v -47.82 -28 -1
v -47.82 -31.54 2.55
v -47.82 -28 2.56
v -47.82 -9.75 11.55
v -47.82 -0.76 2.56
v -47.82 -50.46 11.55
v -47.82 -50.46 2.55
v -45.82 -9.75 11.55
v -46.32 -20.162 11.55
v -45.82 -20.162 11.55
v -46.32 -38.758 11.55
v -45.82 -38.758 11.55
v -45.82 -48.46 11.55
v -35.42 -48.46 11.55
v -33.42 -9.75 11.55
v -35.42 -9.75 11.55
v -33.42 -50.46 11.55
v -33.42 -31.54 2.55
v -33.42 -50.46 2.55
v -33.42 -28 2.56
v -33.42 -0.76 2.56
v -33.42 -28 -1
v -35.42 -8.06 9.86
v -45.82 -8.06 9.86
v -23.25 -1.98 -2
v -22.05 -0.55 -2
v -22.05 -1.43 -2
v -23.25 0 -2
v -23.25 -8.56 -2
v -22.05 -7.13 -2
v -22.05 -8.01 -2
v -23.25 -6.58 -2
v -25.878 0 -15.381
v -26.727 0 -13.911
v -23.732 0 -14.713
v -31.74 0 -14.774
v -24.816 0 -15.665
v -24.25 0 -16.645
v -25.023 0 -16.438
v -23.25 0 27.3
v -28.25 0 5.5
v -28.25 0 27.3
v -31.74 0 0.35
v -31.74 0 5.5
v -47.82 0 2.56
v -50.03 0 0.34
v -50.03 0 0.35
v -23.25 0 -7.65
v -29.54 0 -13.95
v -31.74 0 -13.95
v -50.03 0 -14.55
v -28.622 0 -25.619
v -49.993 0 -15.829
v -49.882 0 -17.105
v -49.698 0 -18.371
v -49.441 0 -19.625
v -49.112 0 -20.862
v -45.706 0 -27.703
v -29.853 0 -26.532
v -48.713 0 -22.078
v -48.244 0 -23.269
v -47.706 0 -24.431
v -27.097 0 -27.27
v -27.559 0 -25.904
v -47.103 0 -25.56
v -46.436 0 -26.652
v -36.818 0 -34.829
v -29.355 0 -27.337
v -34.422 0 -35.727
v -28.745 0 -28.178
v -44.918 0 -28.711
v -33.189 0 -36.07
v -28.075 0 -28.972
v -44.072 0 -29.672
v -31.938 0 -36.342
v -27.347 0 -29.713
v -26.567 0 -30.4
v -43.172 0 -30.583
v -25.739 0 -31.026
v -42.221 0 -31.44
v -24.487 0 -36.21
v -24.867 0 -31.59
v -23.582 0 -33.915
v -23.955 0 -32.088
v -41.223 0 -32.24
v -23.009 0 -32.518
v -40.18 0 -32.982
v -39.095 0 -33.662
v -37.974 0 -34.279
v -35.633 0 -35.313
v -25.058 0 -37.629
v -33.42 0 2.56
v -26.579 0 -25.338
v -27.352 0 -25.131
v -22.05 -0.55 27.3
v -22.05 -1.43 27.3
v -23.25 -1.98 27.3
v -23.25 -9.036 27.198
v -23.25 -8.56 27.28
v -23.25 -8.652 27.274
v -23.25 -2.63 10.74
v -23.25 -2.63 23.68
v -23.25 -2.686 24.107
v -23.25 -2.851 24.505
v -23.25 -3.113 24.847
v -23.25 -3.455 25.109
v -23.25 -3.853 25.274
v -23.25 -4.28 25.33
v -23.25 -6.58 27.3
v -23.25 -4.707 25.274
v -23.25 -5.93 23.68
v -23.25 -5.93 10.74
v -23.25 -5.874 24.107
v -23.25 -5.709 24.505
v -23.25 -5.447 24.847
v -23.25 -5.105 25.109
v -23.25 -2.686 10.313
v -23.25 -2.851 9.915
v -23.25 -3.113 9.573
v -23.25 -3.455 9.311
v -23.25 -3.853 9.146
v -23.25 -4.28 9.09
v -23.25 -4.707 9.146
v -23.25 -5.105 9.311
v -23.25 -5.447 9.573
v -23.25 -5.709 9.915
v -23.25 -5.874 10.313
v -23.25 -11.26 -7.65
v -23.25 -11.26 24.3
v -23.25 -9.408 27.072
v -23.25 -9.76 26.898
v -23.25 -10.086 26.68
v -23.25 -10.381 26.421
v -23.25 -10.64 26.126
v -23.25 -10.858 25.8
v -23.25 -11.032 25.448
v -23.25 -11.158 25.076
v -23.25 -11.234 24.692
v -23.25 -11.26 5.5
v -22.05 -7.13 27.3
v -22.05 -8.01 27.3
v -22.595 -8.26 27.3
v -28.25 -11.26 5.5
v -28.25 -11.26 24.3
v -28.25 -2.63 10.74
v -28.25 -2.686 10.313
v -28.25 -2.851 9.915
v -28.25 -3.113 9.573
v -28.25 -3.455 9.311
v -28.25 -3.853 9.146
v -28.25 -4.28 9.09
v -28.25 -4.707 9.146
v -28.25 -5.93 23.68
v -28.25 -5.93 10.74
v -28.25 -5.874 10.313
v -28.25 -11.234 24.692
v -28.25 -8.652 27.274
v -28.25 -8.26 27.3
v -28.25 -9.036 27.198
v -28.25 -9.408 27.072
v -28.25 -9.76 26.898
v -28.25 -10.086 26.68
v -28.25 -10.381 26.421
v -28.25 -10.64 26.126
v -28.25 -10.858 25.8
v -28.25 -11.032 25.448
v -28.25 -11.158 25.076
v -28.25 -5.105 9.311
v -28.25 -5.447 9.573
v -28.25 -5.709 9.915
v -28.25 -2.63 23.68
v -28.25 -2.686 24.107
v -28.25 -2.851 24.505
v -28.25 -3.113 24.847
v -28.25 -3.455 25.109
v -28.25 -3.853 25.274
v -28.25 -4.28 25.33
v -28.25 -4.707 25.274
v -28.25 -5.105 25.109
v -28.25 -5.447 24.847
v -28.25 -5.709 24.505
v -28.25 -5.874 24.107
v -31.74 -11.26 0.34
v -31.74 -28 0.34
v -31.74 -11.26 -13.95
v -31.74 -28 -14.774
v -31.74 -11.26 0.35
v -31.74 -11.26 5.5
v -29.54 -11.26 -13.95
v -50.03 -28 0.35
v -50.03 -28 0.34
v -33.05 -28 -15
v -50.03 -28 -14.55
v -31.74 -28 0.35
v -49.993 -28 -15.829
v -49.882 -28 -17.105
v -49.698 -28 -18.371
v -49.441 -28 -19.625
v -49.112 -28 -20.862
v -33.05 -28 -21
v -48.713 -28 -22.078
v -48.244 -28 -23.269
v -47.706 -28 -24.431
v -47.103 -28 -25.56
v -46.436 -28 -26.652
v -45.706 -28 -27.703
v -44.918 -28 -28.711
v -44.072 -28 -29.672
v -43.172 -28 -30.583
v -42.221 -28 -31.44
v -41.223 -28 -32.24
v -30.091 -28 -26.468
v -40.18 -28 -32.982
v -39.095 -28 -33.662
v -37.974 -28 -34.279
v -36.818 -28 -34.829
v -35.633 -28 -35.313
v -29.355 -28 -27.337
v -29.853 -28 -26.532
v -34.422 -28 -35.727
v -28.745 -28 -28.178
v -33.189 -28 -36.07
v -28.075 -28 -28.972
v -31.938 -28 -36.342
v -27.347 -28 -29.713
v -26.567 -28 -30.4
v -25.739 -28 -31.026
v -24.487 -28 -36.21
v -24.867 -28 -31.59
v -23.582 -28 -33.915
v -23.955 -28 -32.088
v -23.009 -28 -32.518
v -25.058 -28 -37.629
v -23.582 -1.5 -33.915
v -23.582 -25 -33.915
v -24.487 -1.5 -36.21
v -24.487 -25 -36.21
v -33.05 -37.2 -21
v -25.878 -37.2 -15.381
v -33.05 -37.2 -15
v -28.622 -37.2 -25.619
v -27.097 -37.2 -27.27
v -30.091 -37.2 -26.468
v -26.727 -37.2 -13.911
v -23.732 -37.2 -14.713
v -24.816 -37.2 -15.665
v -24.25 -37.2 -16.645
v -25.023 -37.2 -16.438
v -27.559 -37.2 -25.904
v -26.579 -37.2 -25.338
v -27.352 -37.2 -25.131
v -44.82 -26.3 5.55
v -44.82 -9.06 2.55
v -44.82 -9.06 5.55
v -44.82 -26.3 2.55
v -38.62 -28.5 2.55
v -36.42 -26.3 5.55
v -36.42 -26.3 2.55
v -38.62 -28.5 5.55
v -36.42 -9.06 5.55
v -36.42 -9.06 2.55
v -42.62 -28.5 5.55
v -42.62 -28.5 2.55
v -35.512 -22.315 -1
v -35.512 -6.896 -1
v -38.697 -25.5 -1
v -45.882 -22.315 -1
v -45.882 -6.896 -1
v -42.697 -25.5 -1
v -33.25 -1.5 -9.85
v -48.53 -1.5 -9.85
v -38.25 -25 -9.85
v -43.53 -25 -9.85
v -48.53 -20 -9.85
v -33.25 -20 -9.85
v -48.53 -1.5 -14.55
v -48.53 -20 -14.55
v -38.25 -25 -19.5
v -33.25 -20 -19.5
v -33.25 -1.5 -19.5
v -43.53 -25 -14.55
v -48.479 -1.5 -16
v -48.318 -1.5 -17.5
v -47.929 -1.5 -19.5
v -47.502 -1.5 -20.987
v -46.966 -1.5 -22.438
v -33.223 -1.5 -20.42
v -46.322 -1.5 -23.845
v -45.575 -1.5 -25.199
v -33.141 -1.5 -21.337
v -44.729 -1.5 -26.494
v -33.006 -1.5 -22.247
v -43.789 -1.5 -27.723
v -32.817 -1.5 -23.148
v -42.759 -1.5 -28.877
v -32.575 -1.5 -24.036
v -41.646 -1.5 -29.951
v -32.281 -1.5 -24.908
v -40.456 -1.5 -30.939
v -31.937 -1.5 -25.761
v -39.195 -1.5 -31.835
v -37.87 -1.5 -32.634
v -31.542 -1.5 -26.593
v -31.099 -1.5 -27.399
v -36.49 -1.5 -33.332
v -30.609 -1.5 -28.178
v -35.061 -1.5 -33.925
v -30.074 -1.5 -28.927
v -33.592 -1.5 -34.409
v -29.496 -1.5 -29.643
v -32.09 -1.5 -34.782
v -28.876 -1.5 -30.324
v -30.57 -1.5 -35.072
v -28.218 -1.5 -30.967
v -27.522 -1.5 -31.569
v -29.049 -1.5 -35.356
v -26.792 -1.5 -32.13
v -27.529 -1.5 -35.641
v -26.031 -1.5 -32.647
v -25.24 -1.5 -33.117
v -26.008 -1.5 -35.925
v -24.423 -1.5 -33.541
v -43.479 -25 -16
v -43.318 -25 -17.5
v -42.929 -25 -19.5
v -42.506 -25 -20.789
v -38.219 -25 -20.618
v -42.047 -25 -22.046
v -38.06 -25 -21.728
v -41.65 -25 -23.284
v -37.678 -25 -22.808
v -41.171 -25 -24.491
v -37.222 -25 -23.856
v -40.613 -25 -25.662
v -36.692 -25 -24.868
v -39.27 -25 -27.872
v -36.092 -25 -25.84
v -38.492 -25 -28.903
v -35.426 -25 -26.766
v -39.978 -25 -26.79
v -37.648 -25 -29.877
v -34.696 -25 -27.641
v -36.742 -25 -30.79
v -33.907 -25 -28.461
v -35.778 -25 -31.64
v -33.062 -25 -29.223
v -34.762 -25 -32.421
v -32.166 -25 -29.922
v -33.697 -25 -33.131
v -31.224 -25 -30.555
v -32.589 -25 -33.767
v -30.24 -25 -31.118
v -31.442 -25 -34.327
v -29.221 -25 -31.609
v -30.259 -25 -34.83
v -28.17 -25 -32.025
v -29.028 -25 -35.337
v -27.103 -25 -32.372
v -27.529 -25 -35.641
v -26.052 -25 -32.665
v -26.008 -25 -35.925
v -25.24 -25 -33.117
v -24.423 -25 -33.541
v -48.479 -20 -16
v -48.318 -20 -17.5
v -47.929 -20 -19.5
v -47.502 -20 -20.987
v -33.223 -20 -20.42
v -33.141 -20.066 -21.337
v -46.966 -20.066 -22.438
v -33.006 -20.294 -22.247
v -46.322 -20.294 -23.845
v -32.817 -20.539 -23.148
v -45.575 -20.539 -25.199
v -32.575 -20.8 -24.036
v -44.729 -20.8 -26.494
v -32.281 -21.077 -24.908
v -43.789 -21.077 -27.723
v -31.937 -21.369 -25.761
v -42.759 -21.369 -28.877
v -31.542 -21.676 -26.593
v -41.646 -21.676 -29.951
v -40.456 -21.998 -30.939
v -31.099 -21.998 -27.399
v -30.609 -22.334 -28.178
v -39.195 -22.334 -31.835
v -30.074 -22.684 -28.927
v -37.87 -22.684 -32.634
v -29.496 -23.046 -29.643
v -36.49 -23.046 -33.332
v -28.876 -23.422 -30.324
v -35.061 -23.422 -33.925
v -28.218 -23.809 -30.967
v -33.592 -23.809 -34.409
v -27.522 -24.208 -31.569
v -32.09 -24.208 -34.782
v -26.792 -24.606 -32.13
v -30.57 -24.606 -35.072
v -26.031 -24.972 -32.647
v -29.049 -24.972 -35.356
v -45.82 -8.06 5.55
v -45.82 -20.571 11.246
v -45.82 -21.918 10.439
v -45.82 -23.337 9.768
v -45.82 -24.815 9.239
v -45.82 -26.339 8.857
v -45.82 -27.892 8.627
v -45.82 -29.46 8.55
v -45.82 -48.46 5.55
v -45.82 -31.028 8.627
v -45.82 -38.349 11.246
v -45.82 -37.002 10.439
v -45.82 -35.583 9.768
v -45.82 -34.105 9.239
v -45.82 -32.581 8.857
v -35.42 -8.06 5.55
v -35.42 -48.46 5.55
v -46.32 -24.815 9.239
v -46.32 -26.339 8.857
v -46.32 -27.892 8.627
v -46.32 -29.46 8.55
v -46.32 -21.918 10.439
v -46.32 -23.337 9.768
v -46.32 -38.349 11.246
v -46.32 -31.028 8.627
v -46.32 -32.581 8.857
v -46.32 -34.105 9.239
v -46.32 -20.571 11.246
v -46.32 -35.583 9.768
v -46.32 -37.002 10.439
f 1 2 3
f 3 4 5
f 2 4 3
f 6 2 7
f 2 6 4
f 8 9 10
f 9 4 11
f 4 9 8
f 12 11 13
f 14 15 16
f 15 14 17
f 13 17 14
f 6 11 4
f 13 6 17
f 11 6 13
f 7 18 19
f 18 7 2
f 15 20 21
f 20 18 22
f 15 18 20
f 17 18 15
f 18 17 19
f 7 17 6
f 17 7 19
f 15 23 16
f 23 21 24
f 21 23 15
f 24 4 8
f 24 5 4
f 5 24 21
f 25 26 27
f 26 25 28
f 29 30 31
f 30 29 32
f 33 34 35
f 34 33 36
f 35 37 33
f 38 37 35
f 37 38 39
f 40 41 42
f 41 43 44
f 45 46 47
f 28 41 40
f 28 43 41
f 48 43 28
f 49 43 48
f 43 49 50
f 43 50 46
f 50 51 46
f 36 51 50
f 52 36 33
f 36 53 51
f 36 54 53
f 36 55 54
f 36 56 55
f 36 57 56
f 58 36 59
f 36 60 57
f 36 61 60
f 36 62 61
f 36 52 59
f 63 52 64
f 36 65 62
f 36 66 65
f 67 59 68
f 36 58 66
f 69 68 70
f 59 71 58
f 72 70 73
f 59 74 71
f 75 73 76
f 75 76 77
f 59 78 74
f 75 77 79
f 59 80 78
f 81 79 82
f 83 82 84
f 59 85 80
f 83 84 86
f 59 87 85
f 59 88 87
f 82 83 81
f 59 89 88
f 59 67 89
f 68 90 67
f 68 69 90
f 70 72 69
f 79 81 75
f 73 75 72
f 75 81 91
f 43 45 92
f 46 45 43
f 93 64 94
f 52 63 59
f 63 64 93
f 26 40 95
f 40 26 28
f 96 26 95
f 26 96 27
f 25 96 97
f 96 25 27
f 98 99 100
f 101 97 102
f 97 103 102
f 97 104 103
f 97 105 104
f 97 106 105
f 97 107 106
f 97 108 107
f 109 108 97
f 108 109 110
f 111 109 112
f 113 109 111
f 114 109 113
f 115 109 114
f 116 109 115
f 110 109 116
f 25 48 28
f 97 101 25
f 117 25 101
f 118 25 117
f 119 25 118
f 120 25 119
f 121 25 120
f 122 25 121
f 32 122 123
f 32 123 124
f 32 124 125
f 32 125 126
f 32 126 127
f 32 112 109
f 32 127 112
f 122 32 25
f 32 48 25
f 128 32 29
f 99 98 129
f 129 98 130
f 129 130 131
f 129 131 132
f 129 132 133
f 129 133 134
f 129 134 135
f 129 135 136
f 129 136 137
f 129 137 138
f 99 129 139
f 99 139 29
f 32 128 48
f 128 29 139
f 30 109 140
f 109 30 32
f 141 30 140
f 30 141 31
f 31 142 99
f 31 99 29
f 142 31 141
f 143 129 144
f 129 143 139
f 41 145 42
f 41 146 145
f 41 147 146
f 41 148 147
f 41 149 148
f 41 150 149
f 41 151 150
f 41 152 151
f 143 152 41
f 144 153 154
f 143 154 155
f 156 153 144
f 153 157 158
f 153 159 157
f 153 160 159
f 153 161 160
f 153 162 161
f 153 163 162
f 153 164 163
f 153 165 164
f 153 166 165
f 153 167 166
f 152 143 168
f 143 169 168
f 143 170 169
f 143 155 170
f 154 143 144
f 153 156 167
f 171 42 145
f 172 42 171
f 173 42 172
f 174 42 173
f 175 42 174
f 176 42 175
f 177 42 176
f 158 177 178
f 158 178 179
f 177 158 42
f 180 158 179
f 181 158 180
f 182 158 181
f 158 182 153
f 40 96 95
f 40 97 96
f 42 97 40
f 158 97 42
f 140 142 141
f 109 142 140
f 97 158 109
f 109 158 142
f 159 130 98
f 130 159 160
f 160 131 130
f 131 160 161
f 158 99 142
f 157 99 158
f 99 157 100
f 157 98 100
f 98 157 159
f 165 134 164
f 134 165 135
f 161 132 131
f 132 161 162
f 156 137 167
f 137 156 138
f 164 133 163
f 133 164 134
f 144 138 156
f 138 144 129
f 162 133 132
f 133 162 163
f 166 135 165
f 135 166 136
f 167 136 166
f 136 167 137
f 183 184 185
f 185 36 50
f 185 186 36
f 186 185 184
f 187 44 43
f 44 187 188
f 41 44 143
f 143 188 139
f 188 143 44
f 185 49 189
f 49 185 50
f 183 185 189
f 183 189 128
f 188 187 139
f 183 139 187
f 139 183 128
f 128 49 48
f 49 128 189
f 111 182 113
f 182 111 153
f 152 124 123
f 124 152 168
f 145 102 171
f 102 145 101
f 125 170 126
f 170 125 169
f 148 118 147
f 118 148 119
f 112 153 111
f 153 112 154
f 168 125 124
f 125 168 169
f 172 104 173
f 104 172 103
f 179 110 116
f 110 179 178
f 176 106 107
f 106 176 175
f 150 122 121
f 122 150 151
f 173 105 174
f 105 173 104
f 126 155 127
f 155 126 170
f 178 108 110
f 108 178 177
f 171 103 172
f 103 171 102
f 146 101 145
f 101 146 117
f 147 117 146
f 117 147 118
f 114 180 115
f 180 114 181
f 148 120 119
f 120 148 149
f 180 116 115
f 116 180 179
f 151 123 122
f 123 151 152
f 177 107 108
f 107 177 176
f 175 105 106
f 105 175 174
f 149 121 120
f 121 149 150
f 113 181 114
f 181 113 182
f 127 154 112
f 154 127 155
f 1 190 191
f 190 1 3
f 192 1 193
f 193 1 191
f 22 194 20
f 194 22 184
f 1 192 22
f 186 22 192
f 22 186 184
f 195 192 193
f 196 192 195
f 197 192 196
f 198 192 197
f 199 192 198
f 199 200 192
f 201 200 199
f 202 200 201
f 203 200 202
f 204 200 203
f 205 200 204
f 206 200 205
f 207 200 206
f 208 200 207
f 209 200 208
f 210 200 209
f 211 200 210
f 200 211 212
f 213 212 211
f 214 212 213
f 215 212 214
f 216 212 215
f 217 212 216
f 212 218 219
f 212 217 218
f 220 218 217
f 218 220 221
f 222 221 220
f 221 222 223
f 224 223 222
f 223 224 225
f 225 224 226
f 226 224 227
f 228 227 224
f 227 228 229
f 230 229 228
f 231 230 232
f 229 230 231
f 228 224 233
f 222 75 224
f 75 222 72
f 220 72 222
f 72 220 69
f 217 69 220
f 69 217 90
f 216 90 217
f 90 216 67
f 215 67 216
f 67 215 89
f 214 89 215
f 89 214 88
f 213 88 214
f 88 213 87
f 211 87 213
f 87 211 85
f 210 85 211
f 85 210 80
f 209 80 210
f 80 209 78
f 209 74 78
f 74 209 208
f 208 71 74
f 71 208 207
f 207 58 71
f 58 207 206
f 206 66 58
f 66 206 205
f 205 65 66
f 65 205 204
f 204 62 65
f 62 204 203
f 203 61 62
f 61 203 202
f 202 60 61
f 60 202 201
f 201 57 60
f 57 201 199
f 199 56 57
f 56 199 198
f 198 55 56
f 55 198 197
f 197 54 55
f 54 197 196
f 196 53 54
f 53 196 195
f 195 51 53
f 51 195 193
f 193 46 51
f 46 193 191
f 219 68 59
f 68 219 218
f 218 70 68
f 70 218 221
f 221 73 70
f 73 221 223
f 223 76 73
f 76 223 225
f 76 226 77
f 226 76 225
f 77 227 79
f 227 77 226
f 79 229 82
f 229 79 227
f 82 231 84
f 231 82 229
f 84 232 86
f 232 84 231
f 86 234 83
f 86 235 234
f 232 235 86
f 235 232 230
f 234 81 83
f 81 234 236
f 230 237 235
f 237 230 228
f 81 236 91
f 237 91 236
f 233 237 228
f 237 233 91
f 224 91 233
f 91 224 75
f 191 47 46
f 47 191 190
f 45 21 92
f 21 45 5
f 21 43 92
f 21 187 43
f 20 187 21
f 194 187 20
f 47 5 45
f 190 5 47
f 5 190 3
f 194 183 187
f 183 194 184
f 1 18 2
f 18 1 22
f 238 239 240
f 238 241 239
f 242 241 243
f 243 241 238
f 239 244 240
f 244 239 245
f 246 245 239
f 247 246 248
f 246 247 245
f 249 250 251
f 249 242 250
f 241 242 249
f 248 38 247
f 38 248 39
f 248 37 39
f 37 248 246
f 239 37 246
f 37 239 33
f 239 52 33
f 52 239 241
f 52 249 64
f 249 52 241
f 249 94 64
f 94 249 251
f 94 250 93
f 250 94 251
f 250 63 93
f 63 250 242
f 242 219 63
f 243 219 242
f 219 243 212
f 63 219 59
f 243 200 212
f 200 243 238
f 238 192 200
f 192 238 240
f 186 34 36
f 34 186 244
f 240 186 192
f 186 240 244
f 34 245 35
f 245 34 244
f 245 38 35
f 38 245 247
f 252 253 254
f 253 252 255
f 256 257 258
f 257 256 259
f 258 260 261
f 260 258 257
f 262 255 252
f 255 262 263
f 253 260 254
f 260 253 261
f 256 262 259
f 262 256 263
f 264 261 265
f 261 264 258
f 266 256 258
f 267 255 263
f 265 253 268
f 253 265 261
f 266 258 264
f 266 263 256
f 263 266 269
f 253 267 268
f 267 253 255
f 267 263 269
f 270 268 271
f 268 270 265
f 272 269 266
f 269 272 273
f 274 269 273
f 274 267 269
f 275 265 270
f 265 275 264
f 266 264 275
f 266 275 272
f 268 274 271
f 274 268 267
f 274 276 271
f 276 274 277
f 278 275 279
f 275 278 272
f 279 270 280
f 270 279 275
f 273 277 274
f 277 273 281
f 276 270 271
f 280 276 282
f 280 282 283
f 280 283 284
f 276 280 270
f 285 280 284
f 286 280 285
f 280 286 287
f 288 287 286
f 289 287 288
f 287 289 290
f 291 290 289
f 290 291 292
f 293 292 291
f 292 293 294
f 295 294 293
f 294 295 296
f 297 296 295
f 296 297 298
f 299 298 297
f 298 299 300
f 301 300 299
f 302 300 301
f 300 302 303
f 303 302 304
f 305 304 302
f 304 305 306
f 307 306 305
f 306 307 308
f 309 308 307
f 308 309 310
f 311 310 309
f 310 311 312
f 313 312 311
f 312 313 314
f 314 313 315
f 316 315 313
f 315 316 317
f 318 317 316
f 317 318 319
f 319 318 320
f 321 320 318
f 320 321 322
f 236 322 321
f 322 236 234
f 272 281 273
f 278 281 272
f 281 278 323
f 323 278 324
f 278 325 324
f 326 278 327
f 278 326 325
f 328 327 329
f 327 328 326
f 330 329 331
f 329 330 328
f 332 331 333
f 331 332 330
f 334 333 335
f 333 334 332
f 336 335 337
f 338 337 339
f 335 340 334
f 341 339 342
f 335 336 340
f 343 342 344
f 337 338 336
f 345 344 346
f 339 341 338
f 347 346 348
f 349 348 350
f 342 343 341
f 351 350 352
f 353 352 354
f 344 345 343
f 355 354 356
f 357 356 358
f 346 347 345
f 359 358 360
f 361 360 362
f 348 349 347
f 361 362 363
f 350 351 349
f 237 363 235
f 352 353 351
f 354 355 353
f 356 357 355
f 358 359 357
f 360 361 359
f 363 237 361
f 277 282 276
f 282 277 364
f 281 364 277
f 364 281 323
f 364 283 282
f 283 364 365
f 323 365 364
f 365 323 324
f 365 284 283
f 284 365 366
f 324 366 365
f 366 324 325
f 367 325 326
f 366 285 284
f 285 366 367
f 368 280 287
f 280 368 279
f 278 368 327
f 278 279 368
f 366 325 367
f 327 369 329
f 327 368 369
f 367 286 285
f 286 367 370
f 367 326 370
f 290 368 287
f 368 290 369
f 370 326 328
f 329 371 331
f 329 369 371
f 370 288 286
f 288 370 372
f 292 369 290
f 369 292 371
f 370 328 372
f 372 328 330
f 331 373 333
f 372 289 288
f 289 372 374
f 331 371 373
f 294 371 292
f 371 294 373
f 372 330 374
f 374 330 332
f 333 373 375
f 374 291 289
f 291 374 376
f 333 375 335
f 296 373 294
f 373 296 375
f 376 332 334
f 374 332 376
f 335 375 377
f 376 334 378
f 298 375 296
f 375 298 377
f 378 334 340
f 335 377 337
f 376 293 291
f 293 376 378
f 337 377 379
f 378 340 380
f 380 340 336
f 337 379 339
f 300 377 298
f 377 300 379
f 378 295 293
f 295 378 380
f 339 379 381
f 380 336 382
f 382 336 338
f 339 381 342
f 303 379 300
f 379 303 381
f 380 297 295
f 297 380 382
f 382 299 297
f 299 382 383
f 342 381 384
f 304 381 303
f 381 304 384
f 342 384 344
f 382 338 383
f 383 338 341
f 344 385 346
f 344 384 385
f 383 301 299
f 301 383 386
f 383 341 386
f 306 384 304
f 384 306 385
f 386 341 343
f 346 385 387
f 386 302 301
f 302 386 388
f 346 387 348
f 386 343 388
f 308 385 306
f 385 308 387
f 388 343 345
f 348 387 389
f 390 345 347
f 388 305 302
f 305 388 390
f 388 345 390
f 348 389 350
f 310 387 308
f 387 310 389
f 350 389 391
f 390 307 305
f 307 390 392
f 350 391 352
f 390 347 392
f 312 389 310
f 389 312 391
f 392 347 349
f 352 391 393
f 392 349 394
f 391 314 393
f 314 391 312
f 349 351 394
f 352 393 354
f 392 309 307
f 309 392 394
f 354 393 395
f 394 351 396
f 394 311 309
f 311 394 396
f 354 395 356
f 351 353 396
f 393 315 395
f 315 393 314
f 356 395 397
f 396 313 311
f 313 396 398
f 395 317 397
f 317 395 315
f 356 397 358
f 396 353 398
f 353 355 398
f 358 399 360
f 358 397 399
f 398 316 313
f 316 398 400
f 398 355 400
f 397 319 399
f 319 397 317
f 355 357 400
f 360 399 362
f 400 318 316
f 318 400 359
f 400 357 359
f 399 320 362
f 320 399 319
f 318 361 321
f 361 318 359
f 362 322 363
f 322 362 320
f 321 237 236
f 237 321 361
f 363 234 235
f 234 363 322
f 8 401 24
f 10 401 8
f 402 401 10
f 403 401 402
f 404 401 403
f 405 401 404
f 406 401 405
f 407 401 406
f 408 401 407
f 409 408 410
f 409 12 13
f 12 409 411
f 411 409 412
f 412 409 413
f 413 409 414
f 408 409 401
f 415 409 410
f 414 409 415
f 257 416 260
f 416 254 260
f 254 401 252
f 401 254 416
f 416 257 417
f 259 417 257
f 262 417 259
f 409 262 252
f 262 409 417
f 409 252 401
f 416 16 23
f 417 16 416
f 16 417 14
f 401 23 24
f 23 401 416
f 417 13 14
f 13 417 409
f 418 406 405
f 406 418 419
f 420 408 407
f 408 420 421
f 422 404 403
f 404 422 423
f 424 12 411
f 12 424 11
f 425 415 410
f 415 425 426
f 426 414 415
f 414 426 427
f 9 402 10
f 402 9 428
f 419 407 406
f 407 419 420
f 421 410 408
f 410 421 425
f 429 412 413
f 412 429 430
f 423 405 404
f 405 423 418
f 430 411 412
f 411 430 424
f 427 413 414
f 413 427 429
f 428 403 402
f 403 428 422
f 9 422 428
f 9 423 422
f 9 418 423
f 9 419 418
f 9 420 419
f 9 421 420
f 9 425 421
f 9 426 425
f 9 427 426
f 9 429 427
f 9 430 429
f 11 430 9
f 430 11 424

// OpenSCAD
// file: lib/duct_body.scad
// Body of the one-piece 4010 ducts — Igneus V2 (Anet ET4/ET5)
// Remix of "IGNEUS V2 - E3D V6/VOLCANO" by Locos3D, CC BY-NC-SA 4.0
// https://www.thingiverse.com/thing:4178590
//
// Same frame as duct4010.scad: right-hand part as mounted, Z+ up, X- towards the nozzle, Y- = front.
// Drawn from scratch as a single part: the curves of the air channel, the rails of the mounting arm and its
// height slot are measured from Locos3D's 5015 duct, so it mounts and aims the air like the original.
// It prints lying on its flat back face (y = 0) without supports: every wall is a prism standing on that
// face or rises at 45 degrees, and what is left as a ceiling is a short bridge.

/* [Internal: one-piece duct body] */
// air channel in the XZ plane: inner wall (nozzle side) and outer wall, both arcs ending in the outlet
ch_near_c  = [-18.38, -19.50];   // centre of the inner wall curve
ch_near_r  = [14.07, 15.58];     // its outer face (towards the nozzle) and channel face
ch_near_a  = 67.7;               // the inner wall ends this many degrees below the horizontal
ch_far_c   = [-8.19, -14.55];    // centre of the outer wall curve
ch_far_r   = [20.67, 22.17];     // its channel face and outer face
ch_far_a   = 79.4;               // the curve ends here and a straight lip aims the air at the nozzle
ch_lip     = [7.3, 7.0];         // lip length: channel face, outer face
ch_back    = -1.5;               // channel back face: 1.5 mm wall on the face it prints on
ch_front   = -25.0;              // channel front face: 3 mm front wall
duct_d     = 28.0;               // depth of the duct (Y)
duct_top   = -9.85;              // top of the curved duct = where the air comes in
roof_c     = 5.0;                // 45° chamfers along the front edges of the channel...
roof_ridge = 4.0;                // ...leaving a flat strip this wide (a short bridge when printing)

// mounting arm: rails that slide into the body's grooves and the slot of the height-adjustment screw
arm_x      = [-12.8, -7.8];      // arm face against the body / outer face (the screw head bears on it)
arm_d      = 11.26;              // arm depth (Y)
arm_top    = 27.3;               // top of the arm
rail_tip   = -14.0;              // the rails stick out of the arm face up to here
rails      = [[0, 1.98], [6.58, 8.56]];   // rail bases (depth from the back face); tips 0.55 mm narrower each side
slot_y     = -4.28;              // height slot: centre (Y), width and the Z range of the screw
slot_w     = 3.3;
slot_z     = [9.09, 25.33];
spine_top  = 5.5;                // the block that joins arm and duct stays under the screw head

// derived: straight faces of the walls
near_out_x = ch_near_c[0] + ch_near_r[0];   // -4.31
near_in_x  = ch_near_c[0] + ch_near_r[1];   // -2.80
far_in_x   = ch_far_c[0] + ch_far_r[0];     // 12.48
far_out_x  = ch_far_c[0] + ch_far_r[1];     // 13.98

function pol(c, r, a) = [c[0] + r * cos(a), c[1] + r * sin(a)];
function lerp(a, b, t) = a + (b - a) * t;
function cw_dir(a) = [sin(a), -cos(a)];     // tangent of a circle at angle a, going clockwise
function seg_n(n) = [for (i = [0 : n]) i / n];

// outer wall, channel face: straight, then the arc, then the lip; f = 0..1 from the height of the inner
// wall's centre (where the inner wall starts to curve) to the tip of the lip
far_a0    = asin((ch_near_c[1] - ch_far_c[1]) / ch_far_r[0]);
far_arc_l = ch_far_r[0] * (ch_far_a + far_a0) * PI / 180;
function far_pt(f) = let(s = f * (far_arc_l + ch_lip[0]))
    s <= far_arc_l ? pol(ch_far_c, ch_far_r[0], far_a0 - s / ch_far_r[0] * 180 / PI)
                   : pol(ch_far_c, ch_far_r[0], -ch_far_a) + (s - far_arc_l) * cw_dir(-ch_far_a);
function near_pt(f) = pol(ch_near_c, ch_near_r[1], -f * ch_near_a);
function far_x_at(z) = z >= ch_far_c[1] ? far_in_x : ch_far_c[0] + sqrt(pow(ch_far_r[0], 2) - pow(z - ch_far_c[1], 2));

// Cross-section of the air path: the line from a (inner side) to b (outer side) in XZ, swept in Y from the
// back face yb to the front face yf, with the two front edges chamfered at 45 degrees by c.
function sec(a, b, yb = ch_back, yf = ch_front, c = roof_c) = [a, b, yb, yf, c];
function sec_pts(s) = let(a = s[0], b = s[1], yb = s[2], yf = s[3], l = norm(b - a), u = (b - a) / l,
                          c = min(s[4], max(0, (l - roof_ridge) / 2)))
    [[a[0], yb, a[1]], [b[0], yb, b[1]], [b[0], yf + c, b[1]],
     [b[0] - c * u[0], yf, b[1] - c * u[1]], [a[0] + c * u[0], yf, a[1] + c * u[1]], [a[0], yf + c, a[1]]];

// solid between consecutive cross-sections (each piece is convex, neighbours share a face)
module loft(secs) for (i = [0 : len(secs) - 2])
    hull() polyhedron(points = concat(sec_pts(secs[i]), sec_pts(secs[i + 1])),
                      faces = [[0, 1, 2, 3, 4, 5], [6, 7, 8, 9, 10, 11]]);

// The curved duct, from its top (duct_top) to 1.5 mm past the outlet
function duct_secs(n = 20) = concat(
    [for (z = [duct_top, -12, ch_far_c[1], -16, -17.5, ch_near_c[1]]) sec([near_in_x, z], [far_x_at(z), z])],
    [for (f = seg_n(n)) if (f > 0) sec(near_pt(f), far_pt(f))],
    [sec(near_pt(1) + 1.5 * cw_dir(-ch_near_a), far_pt(1) + 1.5 * cw_dir(-ch_far_a))]);

module duct_channel() loft(duct_secs());

// XZ outline of the duct walls, from z_top down to the outlet
module duct_outline(z_top = duct_top) {
    a_near = -ch_near_a;
    lip_out_end = pol(ch_far_c, ch_far_r[1], -ch_far_a) + ch_lip[1] * cw_dir(-ch_far_a);
    polygon(concat(
        [[near_out_x, z_top]],
        [for (f = seg_n(16)) pol(ch_near_c, ch_near_r[0], -f * ch_near_a)],   // inner wall, nozzle side
        [pol(ch_near_c, ch_near_r[1], a_near)],                              // its end, across the wall
        [far_pt(1)],                                                         // across the outlet
        [lip_out_end],                                                       // end of the lip
        [for (f = seg_n(24)) pol(ch_far_c, ch_far_r[1], -ch_far_a * (1 - f))],   // outer wall, back up
        [[far_out_x, z_top]]));
}

// the duct walls as a prism standing on the back face
module duct_shell(z_top = duct_top) rotate([90, 0, 0]) linear_extrude(height = duct_d) duct_outline(z_top);

// Arm profile in XY (rails on the face against the body)
module arm_profile() {
    teeth = [for (r = rails) each [[arm_x[0], -r[0]], [rail_tip, -r[0] - 0.55], [rail_tip, -r[1] + 0.55], [arm_x[0], -r[1]]]];
    polygon(concat([[arm_x[1], 0], [arm_x[1], -arm_d], [arm_x[0], -arm_d]], [for (i = [len(teeth) - 1 : -1 : 0]) teeth[i]]));
}

// Mounting arm: the rails slide into the grooves on the side of the Igneus body and the M3 screw goes through
// the height slot into the body. The spine joins it to the duct, below the screw head.
module mount_arm() {
    difference() {
        union() {
            intersection() {
                translate([0, 0, -2]) linear_extrude(height = arm_top + 2) arm_profile();
                // round the top front corner (the back corner stays square: it sits on the bed)
                rotate([90, 0, 90]) translate([0, 0, -20]) linear_extrude(height = 20)
                    offset(r = 3) offset(delta = -3) translate([-arm_d, -10]) square([arm_d + 3, arm_top + 10]);
            }
            // spine: from the arm to the inner wall of the duct, chamfered under the arm
            rotate([90, 0, 0]) linear_extrude(height = arm_d)
                polygon([[arm_x[0], spine_top], [near_out_x, spine_top], [near_out_x, duct_top - 4.1],
                         [near_out_x - 2.2, duct_top - 4.1], [arm_x[0], duct_top + 2.2]]);
        }
        slot();
    }
}

module slot()
    hull() for (z = [slot_z[0] + slot_w / 2, slot_z[1] - slot_w / 2])
        translate([arm_x[0] - 2.5, slot_y, z]) rotate([0, 90, 0]) cylinder(d = slot_w, h = arm_x[1] - arm_x[0] + 5, $fn = 24);
// main file
// color: #1d1d1f
// variant: onepiece
// One-piece 4010 duct with the LED channel, left side (as mounted): mirror of the right one.
include <lib/duct4010.scad>

translate([-36.05, 0, 0]) mirror([1, 0, 0]) duct4010();
